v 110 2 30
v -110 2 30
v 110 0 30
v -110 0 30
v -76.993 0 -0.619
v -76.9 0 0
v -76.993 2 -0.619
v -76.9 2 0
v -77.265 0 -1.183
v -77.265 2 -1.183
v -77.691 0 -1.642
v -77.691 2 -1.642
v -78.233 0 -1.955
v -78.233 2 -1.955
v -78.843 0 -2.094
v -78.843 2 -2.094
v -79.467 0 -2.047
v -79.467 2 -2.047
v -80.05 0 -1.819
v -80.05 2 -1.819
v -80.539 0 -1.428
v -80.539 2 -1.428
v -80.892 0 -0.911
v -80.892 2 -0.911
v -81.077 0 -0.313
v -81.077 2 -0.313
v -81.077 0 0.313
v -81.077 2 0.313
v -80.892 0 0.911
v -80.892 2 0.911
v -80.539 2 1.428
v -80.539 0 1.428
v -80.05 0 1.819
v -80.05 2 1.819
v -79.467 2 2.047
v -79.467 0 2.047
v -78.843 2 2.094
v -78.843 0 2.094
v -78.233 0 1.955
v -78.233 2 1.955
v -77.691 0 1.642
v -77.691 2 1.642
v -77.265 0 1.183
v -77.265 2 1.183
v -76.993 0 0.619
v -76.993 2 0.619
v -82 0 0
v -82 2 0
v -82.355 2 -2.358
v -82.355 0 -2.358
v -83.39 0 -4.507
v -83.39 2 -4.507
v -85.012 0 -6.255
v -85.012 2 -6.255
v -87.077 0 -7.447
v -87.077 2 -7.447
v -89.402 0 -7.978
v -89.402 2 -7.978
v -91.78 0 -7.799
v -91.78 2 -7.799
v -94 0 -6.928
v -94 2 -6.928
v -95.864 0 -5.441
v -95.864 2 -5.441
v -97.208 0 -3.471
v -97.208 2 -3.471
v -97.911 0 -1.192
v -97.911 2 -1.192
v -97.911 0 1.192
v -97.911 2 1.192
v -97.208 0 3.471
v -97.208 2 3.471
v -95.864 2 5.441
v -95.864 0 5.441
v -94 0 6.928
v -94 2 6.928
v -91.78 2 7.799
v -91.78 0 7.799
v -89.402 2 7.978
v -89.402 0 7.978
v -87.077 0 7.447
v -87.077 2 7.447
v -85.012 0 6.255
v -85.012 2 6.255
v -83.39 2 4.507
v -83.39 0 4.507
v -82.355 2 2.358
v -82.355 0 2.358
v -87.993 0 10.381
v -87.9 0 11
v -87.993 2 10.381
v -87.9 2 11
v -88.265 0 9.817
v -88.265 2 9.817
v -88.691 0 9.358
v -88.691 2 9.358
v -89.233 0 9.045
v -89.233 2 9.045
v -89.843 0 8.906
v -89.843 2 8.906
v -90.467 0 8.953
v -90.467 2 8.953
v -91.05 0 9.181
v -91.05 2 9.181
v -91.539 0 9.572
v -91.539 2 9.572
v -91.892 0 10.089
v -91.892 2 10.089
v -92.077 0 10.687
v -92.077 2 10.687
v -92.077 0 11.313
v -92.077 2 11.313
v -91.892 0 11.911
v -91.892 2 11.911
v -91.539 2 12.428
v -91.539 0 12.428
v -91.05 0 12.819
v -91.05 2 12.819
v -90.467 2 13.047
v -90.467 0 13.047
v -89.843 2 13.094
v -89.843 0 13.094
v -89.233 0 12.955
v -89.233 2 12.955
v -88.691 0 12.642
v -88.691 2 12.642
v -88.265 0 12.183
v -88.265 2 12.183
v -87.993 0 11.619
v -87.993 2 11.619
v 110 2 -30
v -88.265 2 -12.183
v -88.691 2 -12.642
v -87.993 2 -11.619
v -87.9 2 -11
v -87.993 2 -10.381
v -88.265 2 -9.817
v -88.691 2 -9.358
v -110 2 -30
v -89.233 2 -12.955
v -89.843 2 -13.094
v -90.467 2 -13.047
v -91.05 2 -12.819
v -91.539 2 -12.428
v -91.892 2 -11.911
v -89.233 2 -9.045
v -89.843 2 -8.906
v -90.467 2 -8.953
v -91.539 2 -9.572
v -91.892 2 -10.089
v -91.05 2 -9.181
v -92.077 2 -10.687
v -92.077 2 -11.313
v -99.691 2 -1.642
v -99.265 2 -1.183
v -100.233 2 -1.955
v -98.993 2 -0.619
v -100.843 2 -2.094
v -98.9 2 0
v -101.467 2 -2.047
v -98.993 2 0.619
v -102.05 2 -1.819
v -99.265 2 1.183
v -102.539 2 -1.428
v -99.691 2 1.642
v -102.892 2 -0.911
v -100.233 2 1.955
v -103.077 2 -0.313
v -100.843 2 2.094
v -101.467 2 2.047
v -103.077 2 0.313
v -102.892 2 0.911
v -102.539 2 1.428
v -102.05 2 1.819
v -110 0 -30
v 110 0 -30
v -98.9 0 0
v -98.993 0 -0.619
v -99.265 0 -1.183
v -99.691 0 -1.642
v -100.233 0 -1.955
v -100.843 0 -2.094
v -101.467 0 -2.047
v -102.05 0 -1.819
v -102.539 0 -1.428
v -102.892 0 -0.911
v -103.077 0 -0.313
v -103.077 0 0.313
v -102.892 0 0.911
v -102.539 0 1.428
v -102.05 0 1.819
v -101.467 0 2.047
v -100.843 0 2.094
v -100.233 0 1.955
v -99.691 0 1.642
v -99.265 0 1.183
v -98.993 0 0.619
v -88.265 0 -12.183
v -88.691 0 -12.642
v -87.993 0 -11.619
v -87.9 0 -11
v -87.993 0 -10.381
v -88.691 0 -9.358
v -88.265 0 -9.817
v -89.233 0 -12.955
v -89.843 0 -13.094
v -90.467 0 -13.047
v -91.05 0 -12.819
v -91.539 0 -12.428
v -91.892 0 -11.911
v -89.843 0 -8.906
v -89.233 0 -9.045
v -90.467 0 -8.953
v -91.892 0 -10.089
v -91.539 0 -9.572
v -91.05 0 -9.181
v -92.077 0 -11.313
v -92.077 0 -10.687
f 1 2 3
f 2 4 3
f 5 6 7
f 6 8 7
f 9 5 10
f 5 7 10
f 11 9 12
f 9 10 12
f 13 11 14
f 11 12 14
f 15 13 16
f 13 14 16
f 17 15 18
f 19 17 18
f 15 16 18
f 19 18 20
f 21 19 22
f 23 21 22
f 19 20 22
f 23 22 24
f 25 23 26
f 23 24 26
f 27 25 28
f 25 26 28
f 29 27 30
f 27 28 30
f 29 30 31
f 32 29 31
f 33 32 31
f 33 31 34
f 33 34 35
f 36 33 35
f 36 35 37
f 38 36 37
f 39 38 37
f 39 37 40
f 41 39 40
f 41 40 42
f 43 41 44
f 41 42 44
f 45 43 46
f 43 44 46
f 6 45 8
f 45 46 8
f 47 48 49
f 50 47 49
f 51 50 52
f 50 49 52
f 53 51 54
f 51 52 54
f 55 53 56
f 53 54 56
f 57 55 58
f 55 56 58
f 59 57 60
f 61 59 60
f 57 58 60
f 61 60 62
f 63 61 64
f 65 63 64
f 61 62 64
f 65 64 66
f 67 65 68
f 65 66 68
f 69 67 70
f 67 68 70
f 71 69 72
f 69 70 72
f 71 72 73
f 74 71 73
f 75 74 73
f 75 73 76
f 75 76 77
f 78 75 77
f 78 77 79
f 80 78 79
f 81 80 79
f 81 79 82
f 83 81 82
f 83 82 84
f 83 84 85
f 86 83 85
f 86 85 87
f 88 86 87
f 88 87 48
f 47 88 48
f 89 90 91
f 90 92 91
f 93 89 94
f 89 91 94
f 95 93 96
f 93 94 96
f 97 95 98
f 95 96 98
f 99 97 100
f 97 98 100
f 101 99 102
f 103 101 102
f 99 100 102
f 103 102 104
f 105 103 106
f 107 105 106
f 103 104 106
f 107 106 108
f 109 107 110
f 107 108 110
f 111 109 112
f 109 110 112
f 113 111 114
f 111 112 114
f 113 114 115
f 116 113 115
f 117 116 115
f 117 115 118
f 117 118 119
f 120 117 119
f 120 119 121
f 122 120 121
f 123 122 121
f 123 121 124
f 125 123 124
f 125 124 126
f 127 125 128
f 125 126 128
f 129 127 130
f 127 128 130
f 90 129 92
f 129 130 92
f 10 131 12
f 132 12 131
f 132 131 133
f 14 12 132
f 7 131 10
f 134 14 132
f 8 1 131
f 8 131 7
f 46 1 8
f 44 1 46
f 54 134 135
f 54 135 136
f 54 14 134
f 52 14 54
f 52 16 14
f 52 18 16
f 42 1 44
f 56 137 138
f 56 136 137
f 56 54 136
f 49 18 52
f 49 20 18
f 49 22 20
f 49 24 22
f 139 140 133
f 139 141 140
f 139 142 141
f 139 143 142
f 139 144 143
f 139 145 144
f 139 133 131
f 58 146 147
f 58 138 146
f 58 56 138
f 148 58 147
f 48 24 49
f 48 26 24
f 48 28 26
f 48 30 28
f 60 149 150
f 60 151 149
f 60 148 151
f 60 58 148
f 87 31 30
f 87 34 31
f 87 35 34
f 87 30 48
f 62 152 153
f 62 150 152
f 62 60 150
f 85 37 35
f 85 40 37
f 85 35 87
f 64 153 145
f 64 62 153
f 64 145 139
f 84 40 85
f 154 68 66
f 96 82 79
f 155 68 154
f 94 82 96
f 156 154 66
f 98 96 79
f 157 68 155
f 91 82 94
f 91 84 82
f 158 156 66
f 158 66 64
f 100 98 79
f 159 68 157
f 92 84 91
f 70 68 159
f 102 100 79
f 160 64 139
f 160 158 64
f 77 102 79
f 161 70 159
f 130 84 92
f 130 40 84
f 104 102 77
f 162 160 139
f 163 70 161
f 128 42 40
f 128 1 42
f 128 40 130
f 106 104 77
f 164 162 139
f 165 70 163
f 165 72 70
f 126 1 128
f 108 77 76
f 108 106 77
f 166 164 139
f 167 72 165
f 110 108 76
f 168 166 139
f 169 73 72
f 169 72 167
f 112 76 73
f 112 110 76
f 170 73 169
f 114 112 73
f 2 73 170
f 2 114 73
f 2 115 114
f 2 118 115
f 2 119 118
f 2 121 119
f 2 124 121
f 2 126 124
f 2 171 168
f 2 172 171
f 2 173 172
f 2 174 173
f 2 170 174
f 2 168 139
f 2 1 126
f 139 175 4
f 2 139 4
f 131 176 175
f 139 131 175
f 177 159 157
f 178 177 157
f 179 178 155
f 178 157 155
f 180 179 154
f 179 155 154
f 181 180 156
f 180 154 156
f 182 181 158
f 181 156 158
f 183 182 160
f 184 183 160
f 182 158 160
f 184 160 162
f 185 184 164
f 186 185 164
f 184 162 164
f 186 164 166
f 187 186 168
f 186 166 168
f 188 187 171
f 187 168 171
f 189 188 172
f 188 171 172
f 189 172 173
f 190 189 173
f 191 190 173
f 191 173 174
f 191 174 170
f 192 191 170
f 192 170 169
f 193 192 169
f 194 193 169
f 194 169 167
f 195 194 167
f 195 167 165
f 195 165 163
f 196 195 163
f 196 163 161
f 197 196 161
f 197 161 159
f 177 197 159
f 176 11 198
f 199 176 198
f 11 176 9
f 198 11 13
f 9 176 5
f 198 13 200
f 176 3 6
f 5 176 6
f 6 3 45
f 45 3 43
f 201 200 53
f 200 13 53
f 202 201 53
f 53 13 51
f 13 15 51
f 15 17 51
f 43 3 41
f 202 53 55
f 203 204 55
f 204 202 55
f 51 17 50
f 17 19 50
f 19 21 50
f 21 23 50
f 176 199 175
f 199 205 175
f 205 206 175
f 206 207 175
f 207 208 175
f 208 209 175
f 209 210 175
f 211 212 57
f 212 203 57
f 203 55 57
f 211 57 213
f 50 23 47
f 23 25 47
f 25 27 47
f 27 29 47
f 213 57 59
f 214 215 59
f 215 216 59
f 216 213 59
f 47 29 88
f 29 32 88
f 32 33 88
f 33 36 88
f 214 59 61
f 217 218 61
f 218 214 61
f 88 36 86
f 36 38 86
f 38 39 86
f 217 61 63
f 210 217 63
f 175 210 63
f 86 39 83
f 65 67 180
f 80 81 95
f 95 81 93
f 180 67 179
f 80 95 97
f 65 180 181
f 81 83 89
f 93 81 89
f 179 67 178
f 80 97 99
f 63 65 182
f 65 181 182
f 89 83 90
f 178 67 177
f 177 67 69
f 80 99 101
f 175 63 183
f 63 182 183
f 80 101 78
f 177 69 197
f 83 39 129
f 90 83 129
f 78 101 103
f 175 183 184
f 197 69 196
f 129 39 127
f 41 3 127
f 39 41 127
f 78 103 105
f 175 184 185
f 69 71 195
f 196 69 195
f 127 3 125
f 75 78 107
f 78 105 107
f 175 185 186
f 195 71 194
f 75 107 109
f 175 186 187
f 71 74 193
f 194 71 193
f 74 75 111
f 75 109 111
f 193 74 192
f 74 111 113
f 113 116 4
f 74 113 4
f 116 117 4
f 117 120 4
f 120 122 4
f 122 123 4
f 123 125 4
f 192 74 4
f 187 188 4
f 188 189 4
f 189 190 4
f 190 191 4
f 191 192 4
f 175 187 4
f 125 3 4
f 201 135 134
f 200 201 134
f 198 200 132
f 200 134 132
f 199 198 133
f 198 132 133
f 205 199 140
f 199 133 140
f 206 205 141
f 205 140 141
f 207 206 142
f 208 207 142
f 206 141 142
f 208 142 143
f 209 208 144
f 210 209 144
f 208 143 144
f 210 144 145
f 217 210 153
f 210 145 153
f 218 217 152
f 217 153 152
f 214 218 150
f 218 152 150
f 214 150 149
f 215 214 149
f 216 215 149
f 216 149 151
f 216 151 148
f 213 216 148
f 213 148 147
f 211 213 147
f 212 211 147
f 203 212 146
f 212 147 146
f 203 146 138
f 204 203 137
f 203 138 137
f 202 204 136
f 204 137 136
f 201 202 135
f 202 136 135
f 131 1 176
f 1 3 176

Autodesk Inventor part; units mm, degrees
ref_plane "YZ Plane" through (0, 0, 0) normal (1, 0, 0) x (0, 1, 0)
ref_plane "XZ Plane" through (0, 0, 0) normal (0, 1, 0) x (-1, 0, 0)
ref_plane "XY Plane" through (0, 0, 0) normal (0, 0, 1) x (1, 0, 0)
sketch "スケッチ1" plane through (0, 0, 0) normal (0, 1, 0) x (-1, 0, 0)
  line L0 (-110, -30) -> (110, -30)
  line L1 (110, -30) -> (110, 30)
  line L2 (110, 30) -> (-110, 30)
  line L3 (-110, 30) -> (-110, -30)
  line L4 (-110, -30) -> (110, 30) construction
  line L5 (110, -30) -> (-110, 30) construction
  point P0 (0, 0)
  dimension "d0" = 220
  dimension "d1" = 60
extrude "押し出し1" add sketch "スケッチ1" along normal blind 2
sketch "スケッチ2" plane through (0, 2, 0) normal (0, 1, 0) x (1, 0, 0)
  circle A0 centre (-90, 0) radius 8
  circle A1 centre (-101, 0) radius 2.1
  circle A2 centre (-90, 11) radius 2.1
  circle A3 centre (-79, 0) radius 2.1
  circle A4 centre (-90, -11) radius 2.1
  point P0 (0, 0)
  dimension "d4" = 16
  dimension "d5" = 90
  dimension "d7" = 4.2
  dimension "d8" = 4.2
  dimension "d9" = 4.2
  dimension "d10" = 4.2
  dimension "d13" = 11
  dimension "d14" = 11
  dimension "d15" = 11
  dimension "d16" = 11
extrude "押し出し2" cut sketch "スケッチ2" against normal blind 8
properties part number "snap" material "アルミニウム 6061"
